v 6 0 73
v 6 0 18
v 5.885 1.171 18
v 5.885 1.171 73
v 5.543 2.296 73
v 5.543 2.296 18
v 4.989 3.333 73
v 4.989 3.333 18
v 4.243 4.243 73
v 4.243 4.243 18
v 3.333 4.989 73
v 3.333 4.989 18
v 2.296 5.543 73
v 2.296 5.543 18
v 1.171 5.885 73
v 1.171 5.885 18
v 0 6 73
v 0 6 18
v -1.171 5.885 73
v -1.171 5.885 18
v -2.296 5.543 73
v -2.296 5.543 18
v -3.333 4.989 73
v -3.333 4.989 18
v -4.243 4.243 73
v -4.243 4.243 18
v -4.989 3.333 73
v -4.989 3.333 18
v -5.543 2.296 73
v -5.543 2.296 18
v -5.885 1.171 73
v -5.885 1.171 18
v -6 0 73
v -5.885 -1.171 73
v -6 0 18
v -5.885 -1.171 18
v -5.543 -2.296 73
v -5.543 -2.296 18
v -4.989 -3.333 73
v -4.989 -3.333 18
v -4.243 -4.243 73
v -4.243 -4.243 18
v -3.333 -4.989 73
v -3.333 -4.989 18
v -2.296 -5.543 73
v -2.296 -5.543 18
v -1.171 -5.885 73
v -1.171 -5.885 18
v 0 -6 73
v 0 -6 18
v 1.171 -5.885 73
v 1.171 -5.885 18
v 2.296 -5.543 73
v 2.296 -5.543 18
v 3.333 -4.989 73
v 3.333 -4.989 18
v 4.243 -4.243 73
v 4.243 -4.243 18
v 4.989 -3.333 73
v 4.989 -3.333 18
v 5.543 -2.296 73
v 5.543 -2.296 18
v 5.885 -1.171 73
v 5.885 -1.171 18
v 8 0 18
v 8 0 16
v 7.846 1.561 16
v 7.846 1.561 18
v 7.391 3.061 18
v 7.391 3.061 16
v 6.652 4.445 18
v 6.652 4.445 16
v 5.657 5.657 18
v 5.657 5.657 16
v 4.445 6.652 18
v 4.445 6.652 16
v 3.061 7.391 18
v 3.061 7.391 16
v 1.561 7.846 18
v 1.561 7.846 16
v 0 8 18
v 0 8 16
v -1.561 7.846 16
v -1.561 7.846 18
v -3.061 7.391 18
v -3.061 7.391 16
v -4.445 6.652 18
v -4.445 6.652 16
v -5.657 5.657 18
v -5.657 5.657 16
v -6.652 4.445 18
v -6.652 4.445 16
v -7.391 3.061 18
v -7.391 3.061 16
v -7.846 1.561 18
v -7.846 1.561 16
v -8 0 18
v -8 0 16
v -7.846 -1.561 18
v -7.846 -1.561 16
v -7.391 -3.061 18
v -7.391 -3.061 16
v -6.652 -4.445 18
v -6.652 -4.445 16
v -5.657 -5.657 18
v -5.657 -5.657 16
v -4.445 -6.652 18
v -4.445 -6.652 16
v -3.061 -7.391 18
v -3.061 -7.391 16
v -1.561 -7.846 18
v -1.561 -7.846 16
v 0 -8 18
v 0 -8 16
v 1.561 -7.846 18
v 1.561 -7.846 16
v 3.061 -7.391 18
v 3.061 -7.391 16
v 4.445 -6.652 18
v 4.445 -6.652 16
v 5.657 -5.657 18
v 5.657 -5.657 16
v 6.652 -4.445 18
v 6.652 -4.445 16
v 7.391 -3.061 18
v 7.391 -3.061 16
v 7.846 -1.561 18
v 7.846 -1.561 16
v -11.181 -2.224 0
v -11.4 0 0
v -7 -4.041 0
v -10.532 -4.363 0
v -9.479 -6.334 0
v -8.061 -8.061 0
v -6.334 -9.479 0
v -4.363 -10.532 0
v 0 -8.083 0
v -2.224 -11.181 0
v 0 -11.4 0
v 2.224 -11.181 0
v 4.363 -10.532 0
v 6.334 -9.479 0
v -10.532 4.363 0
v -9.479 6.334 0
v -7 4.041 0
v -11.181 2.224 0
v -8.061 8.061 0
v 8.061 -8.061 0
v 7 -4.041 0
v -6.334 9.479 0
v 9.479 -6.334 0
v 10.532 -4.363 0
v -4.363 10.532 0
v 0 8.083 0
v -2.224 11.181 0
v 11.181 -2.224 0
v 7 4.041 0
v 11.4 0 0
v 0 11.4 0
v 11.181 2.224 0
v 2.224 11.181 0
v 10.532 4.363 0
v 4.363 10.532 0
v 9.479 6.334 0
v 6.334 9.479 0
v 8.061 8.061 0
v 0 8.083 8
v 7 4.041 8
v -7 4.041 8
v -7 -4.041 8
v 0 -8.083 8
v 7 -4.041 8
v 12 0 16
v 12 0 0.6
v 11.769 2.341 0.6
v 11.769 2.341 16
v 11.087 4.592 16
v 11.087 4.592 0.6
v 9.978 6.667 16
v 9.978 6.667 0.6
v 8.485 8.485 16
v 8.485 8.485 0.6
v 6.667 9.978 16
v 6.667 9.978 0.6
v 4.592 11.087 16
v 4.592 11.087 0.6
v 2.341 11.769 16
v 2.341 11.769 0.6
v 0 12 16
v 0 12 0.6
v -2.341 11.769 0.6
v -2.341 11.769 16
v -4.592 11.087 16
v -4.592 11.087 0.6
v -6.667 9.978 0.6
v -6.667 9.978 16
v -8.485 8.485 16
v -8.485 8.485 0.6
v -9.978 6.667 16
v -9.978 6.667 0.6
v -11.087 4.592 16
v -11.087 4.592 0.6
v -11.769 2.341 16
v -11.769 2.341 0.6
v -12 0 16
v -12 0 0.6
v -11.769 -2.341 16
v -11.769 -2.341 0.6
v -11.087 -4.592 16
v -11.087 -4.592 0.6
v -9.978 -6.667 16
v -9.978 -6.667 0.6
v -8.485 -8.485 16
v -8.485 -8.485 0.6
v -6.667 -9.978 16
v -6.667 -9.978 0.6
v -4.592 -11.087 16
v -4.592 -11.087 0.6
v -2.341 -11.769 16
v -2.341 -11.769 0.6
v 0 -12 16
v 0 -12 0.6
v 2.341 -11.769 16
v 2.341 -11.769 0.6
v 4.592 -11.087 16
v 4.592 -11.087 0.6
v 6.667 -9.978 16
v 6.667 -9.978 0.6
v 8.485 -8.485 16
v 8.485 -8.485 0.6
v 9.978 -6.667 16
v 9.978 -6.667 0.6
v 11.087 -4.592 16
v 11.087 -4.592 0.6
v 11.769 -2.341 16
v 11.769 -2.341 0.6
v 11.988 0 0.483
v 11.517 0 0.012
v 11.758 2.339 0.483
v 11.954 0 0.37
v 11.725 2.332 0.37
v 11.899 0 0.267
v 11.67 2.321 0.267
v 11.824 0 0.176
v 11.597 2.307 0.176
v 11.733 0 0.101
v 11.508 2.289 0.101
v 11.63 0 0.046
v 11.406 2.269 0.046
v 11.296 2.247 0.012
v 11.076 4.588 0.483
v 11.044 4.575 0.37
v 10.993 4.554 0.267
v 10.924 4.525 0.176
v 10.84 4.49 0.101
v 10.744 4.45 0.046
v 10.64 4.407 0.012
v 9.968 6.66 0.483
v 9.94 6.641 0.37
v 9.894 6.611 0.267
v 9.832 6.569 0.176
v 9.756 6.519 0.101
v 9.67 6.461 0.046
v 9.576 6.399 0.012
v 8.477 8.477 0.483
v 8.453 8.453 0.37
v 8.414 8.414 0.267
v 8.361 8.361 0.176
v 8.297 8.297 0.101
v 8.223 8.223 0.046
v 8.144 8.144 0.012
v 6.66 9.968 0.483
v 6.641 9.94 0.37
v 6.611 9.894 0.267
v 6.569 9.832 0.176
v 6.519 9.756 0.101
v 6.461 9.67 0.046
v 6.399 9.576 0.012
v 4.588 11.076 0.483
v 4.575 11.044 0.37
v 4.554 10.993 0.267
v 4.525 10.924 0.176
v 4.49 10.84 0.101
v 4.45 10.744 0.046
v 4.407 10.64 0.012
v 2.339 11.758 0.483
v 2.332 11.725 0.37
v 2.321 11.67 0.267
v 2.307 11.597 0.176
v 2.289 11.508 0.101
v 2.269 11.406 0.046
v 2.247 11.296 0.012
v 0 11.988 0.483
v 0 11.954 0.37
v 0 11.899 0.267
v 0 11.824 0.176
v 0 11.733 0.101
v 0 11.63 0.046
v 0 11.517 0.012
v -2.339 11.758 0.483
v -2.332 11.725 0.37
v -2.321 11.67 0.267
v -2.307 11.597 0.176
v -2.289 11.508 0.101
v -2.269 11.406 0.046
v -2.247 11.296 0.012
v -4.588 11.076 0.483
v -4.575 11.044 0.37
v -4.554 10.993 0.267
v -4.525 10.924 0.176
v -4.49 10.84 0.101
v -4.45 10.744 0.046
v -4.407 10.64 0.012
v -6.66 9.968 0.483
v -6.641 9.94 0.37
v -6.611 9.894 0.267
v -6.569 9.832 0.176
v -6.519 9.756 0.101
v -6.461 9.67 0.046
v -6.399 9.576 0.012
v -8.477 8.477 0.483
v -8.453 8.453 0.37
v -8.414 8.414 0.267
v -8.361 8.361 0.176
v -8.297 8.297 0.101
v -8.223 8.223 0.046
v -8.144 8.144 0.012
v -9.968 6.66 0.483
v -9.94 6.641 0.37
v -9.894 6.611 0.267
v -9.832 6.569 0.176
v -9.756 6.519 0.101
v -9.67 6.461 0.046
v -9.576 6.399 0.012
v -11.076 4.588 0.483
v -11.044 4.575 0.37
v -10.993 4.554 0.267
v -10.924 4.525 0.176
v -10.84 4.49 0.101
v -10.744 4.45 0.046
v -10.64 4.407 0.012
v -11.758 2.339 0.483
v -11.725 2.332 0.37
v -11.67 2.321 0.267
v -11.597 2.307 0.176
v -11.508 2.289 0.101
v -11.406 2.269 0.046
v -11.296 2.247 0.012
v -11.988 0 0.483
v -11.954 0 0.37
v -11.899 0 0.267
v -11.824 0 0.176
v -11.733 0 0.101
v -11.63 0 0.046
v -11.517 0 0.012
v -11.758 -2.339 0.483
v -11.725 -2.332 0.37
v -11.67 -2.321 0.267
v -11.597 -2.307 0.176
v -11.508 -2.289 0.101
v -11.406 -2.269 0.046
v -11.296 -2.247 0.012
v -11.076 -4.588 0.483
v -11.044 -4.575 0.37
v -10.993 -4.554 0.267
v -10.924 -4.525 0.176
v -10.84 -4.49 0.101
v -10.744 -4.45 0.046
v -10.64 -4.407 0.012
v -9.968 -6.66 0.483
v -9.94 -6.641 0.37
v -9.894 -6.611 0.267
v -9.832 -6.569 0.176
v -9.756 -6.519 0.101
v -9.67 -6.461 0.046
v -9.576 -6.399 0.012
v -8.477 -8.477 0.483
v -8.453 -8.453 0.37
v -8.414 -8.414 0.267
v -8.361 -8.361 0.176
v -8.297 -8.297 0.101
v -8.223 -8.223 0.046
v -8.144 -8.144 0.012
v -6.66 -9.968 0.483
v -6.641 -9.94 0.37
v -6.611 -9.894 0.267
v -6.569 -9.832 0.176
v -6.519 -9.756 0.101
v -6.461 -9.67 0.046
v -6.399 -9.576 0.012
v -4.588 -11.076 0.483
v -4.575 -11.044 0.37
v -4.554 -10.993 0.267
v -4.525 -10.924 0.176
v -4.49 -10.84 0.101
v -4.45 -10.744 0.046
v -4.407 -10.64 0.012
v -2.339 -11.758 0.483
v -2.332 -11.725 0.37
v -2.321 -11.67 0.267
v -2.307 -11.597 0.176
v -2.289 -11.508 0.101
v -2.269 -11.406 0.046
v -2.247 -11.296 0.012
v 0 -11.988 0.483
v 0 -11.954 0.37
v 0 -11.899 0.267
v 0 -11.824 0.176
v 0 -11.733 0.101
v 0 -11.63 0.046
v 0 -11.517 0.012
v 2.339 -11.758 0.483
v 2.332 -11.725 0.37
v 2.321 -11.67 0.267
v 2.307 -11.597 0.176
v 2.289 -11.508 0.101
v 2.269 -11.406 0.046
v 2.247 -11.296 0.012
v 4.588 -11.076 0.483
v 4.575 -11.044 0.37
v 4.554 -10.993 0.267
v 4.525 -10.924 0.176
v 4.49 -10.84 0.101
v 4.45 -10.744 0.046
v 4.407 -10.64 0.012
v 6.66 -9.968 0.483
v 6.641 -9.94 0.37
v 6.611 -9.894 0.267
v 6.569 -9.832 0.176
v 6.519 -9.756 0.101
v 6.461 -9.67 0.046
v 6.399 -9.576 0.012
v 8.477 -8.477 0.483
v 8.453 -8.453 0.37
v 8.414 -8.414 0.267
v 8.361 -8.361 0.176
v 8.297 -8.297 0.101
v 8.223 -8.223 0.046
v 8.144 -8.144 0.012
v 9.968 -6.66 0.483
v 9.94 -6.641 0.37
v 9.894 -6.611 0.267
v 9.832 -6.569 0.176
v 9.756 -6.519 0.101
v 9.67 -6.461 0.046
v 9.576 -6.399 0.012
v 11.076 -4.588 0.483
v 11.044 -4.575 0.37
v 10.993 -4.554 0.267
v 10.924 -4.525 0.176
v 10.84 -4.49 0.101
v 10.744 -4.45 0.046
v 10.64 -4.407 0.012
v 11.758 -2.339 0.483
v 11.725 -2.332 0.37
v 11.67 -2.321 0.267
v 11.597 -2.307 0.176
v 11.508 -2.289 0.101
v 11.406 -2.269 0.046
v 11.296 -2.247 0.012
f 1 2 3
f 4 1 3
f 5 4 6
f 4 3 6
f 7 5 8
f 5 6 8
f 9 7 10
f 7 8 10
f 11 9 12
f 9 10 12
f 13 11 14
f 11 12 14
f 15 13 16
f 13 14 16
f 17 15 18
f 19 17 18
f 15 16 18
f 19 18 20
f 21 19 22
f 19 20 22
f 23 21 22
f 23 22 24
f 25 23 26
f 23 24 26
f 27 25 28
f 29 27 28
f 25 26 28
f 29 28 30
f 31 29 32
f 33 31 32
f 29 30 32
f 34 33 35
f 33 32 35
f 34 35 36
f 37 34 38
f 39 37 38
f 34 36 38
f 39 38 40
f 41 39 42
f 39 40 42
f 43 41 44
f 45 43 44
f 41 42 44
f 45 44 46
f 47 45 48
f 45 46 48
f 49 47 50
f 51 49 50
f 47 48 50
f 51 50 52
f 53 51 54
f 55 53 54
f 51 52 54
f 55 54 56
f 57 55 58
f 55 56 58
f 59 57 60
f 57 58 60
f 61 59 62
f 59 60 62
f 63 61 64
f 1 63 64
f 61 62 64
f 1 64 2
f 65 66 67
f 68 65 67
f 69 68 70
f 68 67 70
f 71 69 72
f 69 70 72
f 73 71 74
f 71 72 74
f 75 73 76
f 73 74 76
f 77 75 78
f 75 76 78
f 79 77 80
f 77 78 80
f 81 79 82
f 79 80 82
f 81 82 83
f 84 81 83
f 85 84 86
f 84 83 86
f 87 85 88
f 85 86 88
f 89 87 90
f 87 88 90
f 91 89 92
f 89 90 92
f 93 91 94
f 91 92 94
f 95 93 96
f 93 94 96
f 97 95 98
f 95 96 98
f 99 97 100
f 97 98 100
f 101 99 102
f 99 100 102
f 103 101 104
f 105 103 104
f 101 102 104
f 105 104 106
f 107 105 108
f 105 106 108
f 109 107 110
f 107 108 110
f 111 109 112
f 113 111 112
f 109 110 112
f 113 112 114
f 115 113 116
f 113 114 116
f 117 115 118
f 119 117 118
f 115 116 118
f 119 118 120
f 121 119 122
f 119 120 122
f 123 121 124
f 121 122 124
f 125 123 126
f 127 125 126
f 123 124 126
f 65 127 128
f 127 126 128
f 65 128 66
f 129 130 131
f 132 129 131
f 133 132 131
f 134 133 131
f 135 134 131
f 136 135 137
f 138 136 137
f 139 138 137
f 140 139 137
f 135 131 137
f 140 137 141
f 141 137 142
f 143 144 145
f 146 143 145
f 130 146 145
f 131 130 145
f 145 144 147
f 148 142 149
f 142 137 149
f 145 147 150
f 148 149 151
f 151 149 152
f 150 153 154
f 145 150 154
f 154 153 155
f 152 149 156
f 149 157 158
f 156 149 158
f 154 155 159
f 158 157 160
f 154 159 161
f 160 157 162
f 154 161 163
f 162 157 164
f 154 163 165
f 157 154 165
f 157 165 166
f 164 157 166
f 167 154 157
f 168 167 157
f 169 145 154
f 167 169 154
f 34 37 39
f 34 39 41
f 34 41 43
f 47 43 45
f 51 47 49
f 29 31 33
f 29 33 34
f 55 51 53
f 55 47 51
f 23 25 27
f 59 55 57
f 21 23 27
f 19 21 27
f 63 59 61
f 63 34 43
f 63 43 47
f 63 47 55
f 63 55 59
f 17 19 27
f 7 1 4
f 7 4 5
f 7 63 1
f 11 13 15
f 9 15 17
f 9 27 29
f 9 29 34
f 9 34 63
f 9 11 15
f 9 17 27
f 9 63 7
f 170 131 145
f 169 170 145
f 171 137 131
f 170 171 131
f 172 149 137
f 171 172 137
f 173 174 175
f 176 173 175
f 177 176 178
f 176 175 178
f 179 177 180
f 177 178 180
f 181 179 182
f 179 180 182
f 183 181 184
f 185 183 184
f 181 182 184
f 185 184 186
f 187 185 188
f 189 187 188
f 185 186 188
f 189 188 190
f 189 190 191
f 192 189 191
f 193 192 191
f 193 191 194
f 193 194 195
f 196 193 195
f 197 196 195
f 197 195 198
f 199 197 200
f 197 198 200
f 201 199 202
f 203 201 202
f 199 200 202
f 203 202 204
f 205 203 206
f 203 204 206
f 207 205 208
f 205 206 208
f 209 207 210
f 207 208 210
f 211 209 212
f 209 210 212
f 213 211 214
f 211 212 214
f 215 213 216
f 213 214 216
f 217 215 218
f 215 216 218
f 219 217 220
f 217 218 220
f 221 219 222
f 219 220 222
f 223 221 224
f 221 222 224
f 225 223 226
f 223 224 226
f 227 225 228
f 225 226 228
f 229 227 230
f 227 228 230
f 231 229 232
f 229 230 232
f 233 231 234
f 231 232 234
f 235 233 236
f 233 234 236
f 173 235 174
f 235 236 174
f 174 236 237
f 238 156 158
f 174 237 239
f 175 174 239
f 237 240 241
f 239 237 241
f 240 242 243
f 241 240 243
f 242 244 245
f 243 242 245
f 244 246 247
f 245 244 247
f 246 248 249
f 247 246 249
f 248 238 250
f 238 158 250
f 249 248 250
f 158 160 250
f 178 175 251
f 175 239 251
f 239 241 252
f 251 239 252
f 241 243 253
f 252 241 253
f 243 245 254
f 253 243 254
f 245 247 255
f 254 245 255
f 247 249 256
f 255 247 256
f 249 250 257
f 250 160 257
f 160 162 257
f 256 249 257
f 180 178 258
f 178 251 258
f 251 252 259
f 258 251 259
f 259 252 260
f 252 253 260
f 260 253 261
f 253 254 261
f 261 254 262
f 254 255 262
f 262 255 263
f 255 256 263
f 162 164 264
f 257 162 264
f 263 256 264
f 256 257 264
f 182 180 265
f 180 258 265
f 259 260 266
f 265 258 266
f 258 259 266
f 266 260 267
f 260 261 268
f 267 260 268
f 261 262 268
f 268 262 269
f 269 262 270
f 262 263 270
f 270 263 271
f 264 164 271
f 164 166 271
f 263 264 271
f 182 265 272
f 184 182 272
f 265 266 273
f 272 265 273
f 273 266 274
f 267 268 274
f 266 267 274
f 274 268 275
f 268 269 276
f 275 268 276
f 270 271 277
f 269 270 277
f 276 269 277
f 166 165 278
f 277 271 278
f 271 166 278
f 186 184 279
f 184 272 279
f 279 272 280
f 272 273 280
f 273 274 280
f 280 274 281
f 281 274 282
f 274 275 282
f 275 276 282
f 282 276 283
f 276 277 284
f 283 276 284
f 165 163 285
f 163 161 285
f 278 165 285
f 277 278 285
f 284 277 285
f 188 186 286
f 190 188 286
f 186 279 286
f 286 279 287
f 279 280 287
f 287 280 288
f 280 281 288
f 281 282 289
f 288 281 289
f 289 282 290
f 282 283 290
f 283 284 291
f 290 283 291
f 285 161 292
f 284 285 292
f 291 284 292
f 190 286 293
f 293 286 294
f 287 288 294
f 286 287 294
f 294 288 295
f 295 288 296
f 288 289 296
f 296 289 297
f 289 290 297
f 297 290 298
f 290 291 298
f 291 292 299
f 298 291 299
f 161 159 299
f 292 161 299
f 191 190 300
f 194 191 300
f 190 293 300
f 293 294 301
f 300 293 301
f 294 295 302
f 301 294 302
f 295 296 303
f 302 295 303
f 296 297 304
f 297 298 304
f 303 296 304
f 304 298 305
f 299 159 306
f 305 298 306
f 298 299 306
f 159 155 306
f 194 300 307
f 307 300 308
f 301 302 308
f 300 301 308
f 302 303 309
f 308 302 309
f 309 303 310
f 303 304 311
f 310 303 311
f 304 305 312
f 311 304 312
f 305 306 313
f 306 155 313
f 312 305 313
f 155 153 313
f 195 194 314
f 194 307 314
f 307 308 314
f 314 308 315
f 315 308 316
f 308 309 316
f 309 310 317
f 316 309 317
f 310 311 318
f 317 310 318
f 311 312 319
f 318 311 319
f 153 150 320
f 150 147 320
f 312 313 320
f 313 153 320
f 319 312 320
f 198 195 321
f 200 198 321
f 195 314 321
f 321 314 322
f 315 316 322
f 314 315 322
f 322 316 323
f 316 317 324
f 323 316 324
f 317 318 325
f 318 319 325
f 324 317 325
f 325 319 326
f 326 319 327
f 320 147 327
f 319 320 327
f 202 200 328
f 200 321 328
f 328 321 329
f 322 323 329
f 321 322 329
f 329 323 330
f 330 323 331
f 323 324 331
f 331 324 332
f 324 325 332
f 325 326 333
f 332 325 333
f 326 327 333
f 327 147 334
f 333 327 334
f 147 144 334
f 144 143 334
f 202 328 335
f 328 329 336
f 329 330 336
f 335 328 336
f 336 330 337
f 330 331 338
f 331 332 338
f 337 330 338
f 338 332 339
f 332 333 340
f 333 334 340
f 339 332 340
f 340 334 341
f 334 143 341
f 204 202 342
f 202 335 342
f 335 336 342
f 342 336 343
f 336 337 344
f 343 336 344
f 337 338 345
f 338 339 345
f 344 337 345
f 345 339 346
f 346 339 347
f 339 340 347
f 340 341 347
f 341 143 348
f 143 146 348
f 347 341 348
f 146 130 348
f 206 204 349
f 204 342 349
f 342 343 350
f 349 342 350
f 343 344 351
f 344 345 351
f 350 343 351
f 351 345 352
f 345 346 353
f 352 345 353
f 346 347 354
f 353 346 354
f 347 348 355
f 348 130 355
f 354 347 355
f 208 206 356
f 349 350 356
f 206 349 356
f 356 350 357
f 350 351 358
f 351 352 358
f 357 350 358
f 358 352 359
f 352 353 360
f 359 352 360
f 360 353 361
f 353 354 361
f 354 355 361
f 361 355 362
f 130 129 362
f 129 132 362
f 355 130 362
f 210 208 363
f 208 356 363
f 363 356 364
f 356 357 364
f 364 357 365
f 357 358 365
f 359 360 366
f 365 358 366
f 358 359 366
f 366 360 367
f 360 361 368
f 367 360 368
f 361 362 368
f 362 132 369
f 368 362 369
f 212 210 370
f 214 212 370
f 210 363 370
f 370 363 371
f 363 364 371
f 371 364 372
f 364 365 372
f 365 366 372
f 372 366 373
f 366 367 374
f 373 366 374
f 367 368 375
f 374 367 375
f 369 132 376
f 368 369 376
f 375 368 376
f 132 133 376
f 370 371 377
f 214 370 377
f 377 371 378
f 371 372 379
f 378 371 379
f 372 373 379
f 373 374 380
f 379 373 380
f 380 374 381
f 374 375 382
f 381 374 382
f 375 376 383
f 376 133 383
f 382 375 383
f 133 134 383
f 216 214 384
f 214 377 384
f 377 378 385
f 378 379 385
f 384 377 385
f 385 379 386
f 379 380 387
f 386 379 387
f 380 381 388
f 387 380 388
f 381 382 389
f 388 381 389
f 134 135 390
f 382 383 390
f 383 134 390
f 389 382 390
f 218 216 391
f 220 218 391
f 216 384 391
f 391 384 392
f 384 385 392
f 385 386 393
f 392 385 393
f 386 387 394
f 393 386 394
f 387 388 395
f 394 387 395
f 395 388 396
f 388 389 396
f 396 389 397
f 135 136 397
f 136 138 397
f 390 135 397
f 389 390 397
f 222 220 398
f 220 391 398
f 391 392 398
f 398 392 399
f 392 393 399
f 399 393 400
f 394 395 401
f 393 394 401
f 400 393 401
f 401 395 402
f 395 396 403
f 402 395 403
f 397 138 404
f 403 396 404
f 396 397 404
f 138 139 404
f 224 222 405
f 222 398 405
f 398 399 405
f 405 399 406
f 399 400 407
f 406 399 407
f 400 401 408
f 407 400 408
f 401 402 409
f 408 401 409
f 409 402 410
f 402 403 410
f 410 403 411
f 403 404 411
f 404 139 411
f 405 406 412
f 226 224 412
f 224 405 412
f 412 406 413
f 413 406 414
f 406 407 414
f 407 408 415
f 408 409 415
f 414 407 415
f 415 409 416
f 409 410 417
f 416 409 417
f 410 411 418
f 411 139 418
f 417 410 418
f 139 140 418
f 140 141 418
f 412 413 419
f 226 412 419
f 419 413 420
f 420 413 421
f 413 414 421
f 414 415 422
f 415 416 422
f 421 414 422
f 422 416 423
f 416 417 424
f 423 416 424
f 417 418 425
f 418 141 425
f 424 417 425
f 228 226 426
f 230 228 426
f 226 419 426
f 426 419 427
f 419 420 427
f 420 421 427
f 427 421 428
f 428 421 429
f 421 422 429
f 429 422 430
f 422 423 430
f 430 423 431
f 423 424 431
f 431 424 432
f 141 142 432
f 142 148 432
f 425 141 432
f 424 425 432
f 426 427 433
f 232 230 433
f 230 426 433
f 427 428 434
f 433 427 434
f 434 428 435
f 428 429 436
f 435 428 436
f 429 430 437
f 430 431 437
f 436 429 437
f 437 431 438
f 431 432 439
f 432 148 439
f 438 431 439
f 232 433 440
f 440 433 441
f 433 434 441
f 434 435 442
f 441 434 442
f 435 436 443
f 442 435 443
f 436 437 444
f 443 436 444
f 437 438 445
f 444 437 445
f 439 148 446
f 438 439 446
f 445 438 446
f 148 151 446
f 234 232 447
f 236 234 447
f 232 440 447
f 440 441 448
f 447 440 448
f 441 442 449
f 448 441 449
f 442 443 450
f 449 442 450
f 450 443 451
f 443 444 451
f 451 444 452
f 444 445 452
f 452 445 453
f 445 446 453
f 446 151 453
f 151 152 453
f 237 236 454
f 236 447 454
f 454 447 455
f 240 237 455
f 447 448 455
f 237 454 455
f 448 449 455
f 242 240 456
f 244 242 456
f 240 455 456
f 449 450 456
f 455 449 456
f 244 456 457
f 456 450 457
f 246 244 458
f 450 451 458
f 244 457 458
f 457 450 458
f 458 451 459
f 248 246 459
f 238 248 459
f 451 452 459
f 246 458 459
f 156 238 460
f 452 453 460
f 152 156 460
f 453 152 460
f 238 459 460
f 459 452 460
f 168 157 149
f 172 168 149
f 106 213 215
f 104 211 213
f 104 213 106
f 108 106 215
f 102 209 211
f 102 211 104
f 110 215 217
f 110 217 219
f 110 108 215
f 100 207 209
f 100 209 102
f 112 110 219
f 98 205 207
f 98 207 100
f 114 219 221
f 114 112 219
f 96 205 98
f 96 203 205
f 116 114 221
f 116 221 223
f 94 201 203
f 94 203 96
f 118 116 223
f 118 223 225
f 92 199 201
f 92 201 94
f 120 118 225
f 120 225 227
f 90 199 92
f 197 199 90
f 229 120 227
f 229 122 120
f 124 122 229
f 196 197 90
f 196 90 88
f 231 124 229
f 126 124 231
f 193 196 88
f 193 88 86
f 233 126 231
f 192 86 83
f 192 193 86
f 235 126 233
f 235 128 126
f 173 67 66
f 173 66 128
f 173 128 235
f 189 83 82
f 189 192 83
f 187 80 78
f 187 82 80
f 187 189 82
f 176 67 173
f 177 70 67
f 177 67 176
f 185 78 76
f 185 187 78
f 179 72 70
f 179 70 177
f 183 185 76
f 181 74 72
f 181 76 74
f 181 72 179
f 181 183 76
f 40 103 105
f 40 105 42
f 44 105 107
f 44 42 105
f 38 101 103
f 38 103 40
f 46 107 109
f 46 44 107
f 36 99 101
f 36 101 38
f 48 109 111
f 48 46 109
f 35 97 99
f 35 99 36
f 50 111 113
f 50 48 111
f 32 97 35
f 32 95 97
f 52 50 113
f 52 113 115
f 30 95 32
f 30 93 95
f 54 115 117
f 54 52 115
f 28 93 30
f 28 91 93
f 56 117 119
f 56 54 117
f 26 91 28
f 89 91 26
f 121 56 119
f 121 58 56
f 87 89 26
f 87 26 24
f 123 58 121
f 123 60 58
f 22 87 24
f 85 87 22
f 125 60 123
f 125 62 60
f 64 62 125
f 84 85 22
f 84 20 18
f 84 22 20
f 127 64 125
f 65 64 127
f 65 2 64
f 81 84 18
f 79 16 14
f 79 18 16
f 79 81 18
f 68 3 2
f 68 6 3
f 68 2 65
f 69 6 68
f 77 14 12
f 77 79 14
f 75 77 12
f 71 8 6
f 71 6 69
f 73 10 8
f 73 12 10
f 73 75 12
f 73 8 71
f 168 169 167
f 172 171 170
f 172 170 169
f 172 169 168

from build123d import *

# Parameters (mm, degrees)
SKETCH_R     = 12
PAD_DEPTH    = 16
POCKET_DEPTH = 8
FILLET_R     = 0.6
SKETCH002_R  = 8
PAD001_DEPTH = 2
SKETCH003_R  = 6
PAD002_DEPTH = 55


with BuildPart() as part:
    # Sketch → Pad (new body)
    with BuildSketch(Plane.XY):
        Circle(SKETCH_R)
    extrude(amount=PAD_DEPTH)

    # Sketch001 (on Face2 of Pad) → Pocket (cut)
    with BuildSketch(Plane(origin=(0, 0, 0), x_dir=(1, 0, 0), z_dir=(0, 0, -1))):
        Polygon((0, -8.082904), (7, -4.041452), (7, 4.041452), (0, 8.082904), (-7, 4.041452), (-7, -4.041452), align=None)
    extrude(amount=-POCKET_DEPTH, mode=Mode.SUBTRACT)

    # Fillet
    fillet_edges = [part.edges().sort_by_distance(p)[0] for p in [
        (-12, 0, 0),
    ]]
    fillet(fillet_edges, radius=FILLET_R)

    # Sketch002 (on Face3 of Fillet) → Pad001 (join)
    with BuildSketch(Plane.XY.offset(16)):
        Circle(SKETCH002_R)
    extrude(amount=PAD001_DEPTH)

    # Sketch003 (on Face12 of Pad001) → Pad002 (join)
    with BuildSketch(Plane.XY.offset(18)):
        Circle(SKETCH003_R)
    extrude(amount=PAD002_DEPTH)


solid = part.part
